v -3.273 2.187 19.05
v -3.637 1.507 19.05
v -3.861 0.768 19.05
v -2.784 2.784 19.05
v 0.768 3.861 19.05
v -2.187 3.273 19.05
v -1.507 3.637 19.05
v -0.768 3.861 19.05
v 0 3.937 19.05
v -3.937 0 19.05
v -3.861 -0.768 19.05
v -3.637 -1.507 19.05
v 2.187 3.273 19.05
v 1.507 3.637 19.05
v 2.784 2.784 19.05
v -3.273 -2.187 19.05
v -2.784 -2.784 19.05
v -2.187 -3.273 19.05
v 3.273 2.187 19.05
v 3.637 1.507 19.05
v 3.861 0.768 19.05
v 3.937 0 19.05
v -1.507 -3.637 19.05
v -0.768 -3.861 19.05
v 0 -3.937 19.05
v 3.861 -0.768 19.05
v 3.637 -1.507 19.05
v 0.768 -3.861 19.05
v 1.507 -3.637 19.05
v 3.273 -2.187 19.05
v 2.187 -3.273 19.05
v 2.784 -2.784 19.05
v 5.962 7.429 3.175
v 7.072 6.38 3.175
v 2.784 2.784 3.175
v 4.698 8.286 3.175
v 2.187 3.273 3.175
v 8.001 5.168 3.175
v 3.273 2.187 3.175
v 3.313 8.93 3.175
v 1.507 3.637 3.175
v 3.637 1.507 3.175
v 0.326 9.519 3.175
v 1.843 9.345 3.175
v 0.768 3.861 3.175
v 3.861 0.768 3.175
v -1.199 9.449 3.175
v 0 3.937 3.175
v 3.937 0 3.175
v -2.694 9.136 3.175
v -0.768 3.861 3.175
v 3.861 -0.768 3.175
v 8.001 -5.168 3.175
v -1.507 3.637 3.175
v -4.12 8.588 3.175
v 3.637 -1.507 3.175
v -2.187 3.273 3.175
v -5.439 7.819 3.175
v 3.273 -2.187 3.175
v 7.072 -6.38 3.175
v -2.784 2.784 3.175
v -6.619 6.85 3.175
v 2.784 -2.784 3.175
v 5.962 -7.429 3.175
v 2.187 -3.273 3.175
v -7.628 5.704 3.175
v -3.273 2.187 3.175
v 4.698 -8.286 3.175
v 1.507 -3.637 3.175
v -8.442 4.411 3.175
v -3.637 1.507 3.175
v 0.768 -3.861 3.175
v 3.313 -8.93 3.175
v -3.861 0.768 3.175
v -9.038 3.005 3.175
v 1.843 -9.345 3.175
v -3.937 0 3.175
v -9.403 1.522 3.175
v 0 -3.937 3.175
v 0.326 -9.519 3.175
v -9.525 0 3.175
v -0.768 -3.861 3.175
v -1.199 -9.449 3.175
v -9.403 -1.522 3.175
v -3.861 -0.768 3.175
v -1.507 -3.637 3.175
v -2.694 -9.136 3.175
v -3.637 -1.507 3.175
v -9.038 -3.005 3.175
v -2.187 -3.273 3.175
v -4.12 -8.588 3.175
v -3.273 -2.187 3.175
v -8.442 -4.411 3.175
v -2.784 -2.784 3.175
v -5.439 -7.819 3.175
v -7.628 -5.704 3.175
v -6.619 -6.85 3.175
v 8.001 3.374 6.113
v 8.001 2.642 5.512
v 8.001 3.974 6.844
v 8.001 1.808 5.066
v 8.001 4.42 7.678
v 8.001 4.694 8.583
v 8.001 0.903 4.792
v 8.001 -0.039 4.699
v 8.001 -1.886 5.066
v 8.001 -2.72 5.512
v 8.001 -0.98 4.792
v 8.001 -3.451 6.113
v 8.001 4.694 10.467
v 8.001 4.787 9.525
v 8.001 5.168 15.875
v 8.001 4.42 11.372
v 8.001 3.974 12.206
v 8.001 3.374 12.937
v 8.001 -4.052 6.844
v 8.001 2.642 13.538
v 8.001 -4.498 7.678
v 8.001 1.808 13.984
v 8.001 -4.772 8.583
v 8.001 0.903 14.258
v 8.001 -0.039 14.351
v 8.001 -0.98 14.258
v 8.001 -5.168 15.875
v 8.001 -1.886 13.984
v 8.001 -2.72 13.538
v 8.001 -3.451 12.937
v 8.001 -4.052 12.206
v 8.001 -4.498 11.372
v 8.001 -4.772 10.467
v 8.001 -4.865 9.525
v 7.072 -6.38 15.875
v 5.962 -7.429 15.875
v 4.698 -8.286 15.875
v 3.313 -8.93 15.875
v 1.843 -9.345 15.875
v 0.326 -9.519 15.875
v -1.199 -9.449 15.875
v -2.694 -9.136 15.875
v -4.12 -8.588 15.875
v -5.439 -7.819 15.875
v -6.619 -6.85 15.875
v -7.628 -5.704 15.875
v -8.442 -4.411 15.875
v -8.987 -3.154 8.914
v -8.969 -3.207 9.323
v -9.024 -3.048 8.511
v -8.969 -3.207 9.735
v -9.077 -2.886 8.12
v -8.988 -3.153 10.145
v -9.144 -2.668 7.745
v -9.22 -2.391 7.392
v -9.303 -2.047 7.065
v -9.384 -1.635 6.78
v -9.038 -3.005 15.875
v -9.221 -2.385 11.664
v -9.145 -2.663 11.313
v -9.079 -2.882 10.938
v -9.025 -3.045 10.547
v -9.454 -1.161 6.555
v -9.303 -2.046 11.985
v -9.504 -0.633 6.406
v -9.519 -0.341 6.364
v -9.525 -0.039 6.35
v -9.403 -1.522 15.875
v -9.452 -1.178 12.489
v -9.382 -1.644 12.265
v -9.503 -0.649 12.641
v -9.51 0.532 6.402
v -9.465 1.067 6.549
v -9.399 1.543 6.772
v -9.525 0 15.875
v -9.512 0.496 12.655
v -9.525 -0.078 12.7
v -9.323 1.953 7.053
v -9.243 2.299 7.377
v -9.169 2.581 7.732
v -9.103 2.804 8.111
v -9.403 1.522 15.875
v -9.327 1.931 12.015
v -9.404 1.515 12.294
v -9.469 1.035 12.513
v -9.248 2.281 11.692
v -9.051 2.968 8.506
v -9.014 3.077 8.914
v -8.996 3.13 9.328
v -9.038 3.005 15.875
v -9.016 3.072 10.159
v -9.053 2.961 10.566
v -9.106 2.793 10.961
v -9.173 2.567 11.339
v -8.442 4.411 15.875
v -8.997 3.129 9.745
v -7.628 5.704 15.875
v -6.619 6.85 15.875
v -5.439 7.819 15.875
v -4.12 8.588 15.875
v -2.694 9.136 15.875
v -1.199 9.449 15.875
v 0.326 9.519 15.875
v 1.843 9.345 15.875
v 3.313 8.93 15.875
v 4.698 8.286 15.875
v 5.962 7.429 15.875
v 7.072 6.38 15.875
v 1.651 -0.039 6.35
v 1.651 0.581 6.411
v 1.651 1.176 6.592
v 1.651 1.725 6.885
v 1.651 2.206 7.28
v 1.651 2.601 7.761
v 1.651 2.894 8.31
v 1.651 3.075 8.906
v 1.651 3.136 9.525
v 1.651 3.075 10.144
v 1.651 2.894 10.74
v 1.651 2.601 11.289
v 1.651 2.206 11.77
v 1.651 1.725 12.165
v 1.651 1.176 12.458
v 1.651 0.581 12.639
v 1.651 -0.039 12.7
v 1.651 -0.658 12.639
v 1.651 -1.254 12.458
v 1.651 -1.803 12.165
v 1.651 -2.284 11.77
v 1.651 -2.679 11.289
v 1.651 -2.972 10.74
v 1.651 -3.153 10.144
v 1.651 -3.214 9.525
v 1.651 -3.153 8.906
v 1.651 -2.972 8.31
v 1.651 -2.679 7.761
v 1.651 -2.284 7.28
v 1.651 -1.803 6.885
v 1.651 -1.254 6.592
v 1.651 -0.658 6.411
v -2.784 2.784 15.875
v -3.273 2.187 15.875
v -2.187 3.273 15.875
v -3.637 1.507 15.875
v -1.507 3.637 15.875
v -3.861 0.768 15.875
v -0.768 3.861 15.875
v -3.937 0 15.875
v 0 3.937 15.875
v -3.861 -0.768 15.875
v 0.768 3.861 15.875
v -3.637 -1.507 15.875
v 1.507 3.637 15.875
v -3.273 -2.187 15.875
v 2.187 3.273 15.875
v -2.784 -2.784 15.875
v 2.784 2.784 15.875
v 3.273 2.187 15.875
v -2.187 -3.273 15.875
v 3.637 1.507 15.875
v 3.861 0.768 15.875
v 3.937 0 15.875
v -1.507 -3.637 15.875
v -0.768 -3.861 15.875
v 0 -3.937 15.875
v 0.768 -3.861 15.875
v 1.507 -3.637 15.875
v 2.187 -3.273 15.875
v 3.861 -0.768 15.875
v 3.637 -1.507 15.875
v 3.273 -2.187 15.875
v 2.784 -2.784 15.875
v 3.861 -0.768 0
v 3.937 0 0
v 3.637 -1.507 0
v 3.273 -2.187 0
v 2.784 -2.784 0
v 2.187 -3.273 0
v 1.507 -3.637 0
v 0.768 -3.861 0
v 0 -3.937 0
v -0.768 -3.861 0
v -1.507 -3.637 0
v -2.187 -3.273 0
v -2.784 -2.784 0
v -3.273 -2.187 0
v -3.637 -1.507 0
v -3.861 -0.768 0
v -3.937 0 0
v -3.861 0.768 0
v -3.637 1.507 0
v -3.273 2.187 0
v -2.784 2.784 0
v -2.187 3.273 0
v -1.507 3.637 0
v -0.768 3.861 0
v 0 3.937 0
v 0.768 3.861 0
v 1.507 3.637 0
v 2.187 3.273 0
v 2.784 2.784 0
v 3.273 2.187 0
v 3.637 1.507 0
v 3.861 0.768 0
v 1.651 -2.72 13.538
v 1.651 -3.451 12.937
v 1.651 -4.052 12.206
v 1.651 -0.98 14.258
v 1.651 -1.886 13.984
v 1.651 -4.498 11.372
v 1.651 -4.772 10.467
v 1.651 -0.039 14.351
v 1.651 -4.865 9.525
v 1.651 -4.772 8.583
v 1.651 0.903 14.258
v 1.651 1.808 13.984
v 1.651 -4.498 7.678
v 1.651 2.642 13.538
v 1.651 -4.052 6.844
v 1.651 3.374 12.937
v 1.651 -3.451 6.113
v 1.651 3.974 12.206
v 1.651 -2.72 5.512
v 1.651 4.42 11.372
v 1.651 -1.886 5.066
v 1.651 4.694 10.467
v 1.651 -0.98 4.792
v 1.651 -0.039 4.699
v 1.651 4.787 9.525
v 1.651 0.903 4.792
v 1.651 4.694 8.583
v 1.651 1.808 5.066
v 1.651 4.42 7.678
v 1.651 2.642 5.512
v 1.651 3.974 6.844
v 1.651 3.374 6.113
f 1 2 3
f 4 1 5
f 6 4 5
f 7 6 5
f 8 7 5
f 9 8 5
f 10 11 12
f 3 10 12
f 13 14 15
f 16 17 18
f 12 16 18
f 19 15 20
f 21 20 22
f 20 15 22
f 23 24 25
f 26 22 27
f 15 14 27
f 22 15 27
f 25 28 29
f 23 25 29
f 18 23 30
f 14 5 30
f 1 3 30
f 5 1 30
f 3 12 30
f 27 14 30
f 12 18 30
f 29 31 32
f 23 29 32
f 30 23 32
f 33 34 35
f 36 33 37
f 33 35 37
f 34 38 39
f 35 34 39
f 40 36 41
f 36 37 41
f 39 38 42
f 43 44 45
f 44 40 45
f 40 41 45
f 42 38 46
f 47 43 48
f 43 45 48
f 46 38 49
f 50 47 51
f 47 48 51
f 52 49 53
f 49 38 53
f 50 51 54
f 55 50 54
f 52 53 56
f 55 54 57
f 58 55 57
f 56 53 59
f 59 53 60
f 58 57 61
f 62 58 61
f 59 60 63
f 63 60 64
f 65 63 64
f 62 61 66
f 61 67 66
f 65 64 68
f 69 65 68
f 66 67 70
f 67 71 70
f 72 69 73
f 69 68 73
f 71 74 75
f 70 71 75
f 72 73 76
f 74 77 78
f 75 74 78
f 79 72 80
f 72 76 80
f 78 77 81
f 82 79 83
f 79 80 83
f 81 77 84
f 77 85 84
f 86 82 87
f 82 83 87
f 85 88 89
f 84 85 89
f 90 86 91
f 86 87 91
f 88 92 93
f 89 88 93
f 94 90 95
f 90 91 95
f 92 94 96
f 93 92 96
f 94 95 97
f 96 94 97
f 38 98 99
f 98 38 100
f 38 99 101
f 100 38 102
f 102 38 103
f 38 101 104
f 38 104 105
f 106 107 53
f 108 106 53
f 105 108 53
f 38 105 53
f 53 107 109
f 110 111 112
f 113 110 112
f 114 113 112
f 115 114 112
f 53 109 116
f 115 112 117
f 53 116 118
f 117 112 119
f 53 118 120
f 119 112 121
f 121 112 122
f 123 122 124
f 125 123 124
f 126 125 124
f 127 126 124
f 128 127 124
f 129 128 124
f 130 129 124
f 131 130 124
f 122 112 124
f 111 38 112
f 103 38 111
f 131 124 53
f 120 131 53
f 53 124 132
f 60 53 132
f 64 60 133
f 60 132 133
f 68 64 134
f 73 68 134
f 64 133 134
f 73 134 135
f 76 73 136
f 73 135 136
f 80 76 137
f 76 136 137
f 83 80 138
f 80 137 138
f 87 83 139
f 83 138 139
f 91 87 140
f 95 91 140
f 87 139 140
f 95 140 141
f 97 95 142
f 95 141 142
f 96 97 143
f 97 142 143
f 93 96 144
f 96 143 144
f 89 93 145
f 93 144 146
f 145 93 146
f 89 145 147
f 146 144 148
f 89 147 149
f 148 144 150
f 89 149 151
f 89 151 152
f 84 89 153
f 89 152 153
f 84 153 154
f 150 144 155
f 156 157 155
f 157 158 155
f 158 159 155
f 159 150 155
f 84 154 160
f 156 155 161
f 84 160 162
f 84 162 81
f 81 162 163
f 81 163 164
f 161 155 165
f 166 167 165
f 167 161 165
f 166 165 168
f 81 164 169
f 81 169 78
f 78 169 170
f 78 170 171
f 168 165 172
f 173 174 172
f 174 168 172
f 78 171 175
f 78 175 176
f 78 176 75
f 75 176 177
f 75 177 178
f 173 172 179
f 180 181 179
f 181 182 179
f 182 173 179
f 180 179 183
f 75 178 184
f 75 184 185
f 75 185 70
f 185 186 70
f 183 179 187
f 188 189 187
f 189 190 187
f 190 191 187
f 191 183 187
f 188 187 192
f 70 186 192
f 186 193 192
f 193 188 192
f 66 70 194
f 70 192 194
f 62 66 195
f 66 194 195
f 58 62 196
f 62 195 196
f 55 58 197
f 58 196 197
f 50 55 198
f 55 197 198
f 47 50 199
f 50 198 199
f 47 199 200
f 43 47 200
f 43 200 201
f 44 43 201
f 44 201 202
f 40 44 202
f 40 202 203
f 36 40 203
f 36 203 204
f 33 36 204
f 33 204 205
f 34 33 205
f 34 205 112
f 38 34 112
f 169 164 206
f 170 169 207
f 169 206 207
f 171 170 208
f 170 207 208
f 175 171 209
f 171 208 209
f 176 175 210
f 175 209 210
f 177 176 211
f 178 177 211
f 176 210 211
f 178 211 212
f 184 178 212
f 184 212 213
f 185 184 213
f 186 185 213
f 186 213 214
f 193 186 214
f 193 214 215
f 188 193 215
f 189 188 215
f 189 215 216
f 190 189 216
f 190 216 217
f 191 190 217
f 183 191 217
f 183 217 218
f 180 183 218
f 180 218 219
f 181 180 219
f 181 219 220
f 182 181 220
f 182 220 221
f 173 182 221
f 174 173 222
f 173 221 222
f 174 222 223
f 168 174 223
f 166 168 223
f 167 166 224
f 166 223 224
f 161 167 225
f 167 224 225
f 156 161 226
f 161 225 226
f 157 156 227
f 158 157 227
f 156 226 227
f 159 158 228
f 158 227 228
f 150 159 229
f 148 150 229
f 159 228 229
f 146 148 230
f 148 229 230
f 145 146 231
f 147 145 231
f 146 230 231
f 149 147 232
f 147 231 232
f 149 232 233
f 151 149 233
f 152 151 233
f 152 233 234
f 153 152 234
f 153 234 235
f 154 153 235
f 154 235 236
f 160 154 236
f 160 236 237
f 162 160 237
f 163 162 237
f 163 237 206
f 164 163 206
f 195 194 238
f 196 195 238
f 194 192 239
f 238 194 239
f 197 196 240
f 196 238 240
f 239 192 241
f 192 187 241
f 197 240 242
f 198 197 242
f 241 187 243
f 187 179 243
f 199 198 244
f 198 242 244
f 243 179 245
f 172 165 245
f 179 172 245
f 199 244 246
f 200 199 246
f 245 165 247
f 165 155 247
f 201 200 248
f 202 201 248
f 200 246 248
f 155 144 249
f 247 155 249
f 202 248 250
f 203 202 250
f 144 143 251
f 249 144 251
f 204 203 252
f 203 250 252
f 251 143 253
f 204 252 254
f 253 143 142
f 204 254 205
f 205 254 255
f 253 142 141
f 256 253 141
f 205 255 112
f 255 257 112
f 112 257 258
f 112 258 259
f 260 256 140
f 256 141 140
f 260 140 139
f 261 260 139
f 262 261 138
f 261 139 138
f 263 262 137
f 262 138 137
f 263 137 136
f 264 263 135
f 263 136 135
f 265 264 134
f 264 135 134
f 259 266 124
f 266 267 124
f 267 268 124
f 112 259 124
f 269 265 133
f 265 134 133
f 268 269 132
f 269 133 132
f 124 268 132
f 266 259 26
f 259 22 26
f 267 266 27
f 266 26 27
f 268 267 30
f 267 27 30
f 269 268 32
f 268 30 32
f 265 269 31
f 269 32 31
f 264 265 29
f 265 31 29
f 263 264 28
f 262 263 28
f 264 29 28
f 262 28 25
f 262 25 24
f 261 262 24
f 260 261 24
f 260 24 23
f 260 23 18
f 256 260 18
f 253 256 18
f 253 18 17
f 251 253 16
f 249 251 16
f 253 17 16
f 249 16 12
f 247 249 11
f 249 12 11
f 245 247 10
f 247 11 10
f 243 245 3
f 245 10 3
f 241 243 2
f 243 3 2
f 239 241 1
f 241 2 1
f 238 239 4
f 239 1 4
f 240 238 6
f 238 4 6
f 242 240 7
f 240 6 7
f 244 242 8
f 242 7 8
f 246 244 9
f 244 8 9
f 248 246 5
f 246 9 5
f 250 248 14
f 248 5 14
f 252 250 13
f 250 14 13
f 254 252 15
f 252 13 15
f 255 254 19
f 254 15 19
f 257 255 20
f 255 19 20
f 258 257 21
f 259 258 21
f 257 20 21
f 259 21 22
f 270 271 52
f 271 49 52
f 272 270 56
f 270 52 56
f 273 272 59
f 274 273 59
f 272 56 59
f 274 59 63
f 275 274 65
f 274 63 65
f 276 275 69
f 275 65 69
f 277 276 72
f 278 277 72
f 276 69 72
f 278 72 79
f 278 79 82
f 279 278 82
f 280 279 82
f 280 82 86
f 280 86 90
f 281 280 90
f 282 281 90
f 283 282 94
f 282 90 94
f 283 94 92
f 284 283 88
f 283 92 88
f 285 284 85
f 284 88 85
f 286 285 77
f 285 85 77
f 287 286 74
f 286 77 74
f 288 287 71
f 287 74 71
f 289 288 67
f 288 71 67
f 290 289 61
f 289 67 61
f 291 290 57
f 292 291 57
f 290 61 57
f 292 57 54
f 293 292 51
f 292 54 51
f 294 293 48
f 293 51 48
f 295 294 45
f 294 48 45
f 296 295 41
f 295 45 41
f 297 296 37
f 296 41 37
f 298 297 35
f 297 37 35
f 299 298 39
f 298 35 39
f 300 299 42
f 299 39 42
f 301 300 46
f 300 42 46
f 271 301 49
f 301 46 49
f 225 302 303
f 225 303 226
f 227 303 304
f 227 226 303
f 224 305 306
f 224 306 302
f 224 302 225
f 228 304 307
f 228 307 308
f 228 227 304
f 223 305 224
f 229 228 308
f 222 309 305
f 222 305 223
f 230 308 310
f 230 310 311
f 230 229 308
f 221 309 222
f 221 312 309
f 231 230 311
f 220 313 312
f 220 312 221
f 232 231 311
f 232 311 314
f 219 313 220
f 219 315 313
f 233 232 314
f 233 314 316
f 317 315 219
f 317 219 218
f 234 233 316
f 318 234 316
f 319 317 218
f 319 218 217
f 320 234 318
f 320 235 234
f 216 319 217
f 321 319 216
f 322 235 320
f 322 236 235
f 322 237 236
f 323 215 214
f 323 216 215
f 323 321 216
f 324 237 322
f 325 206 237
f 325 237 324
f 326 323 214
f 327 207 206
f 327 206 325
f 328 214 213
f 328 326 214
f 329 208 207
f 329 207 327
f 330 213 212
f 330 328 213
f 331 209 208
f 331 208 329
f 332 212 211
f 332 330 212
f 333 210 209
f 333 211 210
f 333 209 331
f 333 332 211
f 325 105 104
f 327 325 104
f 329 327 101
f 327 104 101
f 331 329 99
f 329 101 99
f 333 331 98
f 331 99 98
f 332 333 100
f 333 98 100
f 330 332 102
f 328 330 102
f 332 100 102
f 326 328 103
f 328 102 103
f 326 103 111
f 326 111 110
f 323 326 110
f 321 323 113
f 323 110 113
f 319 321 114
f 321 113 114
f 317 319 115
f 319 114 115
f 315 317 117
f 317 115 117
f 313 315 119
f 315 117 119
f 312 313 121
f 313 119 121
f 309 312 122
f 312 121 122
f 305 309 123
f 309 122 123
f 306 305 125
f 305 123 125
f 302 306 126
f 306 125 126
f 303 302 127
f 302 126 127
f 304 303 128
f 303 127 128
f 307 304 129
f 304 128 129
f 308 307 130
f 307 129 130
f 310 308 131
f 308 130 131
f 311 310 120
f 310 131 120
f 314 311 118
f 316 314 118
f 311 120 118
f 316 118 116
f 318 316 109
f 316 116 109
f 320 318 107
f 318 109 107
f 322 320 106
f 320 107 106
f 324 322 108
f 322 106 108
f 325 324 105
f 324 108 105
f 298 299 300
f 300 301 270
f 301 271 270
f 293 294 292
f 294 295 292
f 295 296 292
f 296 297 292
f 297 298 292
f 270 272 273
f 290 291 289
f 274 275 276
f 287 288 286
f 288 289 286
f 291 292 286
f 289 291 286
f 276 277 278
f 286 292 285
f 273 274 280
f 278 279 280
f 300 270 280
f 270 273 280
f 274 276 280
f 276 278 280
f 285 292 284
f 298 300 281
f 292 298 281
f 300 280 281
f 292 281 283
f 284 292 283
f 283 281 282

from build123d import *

# Parameters (mm, degrees)
CUT_EXTRUDE1_DEPTH = 12.7
SKETCH3_R          = 3.175
CUT_EXTRUDE2_DEPTH = 28.582400204
SKETCH3_3_R        = 4.826
SKETCH3_3_R_2      = 3.175
CUT_EXTRUDE3_DEPTH = 6.35


with BuildPart() as part:
    # Sketch1 → Revolve1 (revolve)
    with BuildSketch(Plane(origin=(0, 0, 0), x_dir=(1, 0, 0), z_dir=(0, 1, 0))):
        Polygon((0, 0), (3.937, 0), (3.937, -3.175), (9.525, -3.175), (9.525, -15.875), (3.937, -15.875), (3.937, -19.05), (0, -19.05), align=None)
    revolve(axis=Axis((0, 0, 19.05), (0, 0, -1)))

    # Sketch2 → Cut-Extrude1 (cut)
    with BuildSketch(Plane.XY.offset(15.875)):
        Polygon((8.001, 60.908660379), (8.001, 5.168135447), (8.001, 0), (8.001, -5.168135447), (8.001, -60.908660379), (119.482049864, -60.908660379), (119.482049864, 60.908660379), align=None)
    extrude(amount=-CUT_EXTRUDE1_DEPTH, mode=Mode.SUBTRACT)

    # Sketch3 → Cut-Extrude2 (cut, through all)
    with BuildSketch(Plane(origin=(8.001, 0, 0), x_dir=(0, 0, -1), z_dir=(1, 0, 0))):
        with Locations((-9.525, -0.038864553)):
            Circle(SKETCH3_R)
    extrude(amount=-CUT_EXTRUDE2_DEPTH, mode=Mode.SUBTRACT)

    # Sketch3<3> → Cut-Extrude3 (cut)
    with BuildSketch(Plane(origin=(8.001, 0, 0), x_dir=(0, 0, -1), z_dir=(1, 0, 0))):
        with Locations((-9.525, -0.038864553)):
            Circle(SKETCH3_3_R)
        with Locations((-9.525, -0.038864553)):
            Circle(SKETCH3_3_R_2, mode=Mode.SUBTRACT)
    extrude(amount=-CUT_EXTRUDE3_DEPTH, mode=Mode.SUBTRACT)


solid = part.part
